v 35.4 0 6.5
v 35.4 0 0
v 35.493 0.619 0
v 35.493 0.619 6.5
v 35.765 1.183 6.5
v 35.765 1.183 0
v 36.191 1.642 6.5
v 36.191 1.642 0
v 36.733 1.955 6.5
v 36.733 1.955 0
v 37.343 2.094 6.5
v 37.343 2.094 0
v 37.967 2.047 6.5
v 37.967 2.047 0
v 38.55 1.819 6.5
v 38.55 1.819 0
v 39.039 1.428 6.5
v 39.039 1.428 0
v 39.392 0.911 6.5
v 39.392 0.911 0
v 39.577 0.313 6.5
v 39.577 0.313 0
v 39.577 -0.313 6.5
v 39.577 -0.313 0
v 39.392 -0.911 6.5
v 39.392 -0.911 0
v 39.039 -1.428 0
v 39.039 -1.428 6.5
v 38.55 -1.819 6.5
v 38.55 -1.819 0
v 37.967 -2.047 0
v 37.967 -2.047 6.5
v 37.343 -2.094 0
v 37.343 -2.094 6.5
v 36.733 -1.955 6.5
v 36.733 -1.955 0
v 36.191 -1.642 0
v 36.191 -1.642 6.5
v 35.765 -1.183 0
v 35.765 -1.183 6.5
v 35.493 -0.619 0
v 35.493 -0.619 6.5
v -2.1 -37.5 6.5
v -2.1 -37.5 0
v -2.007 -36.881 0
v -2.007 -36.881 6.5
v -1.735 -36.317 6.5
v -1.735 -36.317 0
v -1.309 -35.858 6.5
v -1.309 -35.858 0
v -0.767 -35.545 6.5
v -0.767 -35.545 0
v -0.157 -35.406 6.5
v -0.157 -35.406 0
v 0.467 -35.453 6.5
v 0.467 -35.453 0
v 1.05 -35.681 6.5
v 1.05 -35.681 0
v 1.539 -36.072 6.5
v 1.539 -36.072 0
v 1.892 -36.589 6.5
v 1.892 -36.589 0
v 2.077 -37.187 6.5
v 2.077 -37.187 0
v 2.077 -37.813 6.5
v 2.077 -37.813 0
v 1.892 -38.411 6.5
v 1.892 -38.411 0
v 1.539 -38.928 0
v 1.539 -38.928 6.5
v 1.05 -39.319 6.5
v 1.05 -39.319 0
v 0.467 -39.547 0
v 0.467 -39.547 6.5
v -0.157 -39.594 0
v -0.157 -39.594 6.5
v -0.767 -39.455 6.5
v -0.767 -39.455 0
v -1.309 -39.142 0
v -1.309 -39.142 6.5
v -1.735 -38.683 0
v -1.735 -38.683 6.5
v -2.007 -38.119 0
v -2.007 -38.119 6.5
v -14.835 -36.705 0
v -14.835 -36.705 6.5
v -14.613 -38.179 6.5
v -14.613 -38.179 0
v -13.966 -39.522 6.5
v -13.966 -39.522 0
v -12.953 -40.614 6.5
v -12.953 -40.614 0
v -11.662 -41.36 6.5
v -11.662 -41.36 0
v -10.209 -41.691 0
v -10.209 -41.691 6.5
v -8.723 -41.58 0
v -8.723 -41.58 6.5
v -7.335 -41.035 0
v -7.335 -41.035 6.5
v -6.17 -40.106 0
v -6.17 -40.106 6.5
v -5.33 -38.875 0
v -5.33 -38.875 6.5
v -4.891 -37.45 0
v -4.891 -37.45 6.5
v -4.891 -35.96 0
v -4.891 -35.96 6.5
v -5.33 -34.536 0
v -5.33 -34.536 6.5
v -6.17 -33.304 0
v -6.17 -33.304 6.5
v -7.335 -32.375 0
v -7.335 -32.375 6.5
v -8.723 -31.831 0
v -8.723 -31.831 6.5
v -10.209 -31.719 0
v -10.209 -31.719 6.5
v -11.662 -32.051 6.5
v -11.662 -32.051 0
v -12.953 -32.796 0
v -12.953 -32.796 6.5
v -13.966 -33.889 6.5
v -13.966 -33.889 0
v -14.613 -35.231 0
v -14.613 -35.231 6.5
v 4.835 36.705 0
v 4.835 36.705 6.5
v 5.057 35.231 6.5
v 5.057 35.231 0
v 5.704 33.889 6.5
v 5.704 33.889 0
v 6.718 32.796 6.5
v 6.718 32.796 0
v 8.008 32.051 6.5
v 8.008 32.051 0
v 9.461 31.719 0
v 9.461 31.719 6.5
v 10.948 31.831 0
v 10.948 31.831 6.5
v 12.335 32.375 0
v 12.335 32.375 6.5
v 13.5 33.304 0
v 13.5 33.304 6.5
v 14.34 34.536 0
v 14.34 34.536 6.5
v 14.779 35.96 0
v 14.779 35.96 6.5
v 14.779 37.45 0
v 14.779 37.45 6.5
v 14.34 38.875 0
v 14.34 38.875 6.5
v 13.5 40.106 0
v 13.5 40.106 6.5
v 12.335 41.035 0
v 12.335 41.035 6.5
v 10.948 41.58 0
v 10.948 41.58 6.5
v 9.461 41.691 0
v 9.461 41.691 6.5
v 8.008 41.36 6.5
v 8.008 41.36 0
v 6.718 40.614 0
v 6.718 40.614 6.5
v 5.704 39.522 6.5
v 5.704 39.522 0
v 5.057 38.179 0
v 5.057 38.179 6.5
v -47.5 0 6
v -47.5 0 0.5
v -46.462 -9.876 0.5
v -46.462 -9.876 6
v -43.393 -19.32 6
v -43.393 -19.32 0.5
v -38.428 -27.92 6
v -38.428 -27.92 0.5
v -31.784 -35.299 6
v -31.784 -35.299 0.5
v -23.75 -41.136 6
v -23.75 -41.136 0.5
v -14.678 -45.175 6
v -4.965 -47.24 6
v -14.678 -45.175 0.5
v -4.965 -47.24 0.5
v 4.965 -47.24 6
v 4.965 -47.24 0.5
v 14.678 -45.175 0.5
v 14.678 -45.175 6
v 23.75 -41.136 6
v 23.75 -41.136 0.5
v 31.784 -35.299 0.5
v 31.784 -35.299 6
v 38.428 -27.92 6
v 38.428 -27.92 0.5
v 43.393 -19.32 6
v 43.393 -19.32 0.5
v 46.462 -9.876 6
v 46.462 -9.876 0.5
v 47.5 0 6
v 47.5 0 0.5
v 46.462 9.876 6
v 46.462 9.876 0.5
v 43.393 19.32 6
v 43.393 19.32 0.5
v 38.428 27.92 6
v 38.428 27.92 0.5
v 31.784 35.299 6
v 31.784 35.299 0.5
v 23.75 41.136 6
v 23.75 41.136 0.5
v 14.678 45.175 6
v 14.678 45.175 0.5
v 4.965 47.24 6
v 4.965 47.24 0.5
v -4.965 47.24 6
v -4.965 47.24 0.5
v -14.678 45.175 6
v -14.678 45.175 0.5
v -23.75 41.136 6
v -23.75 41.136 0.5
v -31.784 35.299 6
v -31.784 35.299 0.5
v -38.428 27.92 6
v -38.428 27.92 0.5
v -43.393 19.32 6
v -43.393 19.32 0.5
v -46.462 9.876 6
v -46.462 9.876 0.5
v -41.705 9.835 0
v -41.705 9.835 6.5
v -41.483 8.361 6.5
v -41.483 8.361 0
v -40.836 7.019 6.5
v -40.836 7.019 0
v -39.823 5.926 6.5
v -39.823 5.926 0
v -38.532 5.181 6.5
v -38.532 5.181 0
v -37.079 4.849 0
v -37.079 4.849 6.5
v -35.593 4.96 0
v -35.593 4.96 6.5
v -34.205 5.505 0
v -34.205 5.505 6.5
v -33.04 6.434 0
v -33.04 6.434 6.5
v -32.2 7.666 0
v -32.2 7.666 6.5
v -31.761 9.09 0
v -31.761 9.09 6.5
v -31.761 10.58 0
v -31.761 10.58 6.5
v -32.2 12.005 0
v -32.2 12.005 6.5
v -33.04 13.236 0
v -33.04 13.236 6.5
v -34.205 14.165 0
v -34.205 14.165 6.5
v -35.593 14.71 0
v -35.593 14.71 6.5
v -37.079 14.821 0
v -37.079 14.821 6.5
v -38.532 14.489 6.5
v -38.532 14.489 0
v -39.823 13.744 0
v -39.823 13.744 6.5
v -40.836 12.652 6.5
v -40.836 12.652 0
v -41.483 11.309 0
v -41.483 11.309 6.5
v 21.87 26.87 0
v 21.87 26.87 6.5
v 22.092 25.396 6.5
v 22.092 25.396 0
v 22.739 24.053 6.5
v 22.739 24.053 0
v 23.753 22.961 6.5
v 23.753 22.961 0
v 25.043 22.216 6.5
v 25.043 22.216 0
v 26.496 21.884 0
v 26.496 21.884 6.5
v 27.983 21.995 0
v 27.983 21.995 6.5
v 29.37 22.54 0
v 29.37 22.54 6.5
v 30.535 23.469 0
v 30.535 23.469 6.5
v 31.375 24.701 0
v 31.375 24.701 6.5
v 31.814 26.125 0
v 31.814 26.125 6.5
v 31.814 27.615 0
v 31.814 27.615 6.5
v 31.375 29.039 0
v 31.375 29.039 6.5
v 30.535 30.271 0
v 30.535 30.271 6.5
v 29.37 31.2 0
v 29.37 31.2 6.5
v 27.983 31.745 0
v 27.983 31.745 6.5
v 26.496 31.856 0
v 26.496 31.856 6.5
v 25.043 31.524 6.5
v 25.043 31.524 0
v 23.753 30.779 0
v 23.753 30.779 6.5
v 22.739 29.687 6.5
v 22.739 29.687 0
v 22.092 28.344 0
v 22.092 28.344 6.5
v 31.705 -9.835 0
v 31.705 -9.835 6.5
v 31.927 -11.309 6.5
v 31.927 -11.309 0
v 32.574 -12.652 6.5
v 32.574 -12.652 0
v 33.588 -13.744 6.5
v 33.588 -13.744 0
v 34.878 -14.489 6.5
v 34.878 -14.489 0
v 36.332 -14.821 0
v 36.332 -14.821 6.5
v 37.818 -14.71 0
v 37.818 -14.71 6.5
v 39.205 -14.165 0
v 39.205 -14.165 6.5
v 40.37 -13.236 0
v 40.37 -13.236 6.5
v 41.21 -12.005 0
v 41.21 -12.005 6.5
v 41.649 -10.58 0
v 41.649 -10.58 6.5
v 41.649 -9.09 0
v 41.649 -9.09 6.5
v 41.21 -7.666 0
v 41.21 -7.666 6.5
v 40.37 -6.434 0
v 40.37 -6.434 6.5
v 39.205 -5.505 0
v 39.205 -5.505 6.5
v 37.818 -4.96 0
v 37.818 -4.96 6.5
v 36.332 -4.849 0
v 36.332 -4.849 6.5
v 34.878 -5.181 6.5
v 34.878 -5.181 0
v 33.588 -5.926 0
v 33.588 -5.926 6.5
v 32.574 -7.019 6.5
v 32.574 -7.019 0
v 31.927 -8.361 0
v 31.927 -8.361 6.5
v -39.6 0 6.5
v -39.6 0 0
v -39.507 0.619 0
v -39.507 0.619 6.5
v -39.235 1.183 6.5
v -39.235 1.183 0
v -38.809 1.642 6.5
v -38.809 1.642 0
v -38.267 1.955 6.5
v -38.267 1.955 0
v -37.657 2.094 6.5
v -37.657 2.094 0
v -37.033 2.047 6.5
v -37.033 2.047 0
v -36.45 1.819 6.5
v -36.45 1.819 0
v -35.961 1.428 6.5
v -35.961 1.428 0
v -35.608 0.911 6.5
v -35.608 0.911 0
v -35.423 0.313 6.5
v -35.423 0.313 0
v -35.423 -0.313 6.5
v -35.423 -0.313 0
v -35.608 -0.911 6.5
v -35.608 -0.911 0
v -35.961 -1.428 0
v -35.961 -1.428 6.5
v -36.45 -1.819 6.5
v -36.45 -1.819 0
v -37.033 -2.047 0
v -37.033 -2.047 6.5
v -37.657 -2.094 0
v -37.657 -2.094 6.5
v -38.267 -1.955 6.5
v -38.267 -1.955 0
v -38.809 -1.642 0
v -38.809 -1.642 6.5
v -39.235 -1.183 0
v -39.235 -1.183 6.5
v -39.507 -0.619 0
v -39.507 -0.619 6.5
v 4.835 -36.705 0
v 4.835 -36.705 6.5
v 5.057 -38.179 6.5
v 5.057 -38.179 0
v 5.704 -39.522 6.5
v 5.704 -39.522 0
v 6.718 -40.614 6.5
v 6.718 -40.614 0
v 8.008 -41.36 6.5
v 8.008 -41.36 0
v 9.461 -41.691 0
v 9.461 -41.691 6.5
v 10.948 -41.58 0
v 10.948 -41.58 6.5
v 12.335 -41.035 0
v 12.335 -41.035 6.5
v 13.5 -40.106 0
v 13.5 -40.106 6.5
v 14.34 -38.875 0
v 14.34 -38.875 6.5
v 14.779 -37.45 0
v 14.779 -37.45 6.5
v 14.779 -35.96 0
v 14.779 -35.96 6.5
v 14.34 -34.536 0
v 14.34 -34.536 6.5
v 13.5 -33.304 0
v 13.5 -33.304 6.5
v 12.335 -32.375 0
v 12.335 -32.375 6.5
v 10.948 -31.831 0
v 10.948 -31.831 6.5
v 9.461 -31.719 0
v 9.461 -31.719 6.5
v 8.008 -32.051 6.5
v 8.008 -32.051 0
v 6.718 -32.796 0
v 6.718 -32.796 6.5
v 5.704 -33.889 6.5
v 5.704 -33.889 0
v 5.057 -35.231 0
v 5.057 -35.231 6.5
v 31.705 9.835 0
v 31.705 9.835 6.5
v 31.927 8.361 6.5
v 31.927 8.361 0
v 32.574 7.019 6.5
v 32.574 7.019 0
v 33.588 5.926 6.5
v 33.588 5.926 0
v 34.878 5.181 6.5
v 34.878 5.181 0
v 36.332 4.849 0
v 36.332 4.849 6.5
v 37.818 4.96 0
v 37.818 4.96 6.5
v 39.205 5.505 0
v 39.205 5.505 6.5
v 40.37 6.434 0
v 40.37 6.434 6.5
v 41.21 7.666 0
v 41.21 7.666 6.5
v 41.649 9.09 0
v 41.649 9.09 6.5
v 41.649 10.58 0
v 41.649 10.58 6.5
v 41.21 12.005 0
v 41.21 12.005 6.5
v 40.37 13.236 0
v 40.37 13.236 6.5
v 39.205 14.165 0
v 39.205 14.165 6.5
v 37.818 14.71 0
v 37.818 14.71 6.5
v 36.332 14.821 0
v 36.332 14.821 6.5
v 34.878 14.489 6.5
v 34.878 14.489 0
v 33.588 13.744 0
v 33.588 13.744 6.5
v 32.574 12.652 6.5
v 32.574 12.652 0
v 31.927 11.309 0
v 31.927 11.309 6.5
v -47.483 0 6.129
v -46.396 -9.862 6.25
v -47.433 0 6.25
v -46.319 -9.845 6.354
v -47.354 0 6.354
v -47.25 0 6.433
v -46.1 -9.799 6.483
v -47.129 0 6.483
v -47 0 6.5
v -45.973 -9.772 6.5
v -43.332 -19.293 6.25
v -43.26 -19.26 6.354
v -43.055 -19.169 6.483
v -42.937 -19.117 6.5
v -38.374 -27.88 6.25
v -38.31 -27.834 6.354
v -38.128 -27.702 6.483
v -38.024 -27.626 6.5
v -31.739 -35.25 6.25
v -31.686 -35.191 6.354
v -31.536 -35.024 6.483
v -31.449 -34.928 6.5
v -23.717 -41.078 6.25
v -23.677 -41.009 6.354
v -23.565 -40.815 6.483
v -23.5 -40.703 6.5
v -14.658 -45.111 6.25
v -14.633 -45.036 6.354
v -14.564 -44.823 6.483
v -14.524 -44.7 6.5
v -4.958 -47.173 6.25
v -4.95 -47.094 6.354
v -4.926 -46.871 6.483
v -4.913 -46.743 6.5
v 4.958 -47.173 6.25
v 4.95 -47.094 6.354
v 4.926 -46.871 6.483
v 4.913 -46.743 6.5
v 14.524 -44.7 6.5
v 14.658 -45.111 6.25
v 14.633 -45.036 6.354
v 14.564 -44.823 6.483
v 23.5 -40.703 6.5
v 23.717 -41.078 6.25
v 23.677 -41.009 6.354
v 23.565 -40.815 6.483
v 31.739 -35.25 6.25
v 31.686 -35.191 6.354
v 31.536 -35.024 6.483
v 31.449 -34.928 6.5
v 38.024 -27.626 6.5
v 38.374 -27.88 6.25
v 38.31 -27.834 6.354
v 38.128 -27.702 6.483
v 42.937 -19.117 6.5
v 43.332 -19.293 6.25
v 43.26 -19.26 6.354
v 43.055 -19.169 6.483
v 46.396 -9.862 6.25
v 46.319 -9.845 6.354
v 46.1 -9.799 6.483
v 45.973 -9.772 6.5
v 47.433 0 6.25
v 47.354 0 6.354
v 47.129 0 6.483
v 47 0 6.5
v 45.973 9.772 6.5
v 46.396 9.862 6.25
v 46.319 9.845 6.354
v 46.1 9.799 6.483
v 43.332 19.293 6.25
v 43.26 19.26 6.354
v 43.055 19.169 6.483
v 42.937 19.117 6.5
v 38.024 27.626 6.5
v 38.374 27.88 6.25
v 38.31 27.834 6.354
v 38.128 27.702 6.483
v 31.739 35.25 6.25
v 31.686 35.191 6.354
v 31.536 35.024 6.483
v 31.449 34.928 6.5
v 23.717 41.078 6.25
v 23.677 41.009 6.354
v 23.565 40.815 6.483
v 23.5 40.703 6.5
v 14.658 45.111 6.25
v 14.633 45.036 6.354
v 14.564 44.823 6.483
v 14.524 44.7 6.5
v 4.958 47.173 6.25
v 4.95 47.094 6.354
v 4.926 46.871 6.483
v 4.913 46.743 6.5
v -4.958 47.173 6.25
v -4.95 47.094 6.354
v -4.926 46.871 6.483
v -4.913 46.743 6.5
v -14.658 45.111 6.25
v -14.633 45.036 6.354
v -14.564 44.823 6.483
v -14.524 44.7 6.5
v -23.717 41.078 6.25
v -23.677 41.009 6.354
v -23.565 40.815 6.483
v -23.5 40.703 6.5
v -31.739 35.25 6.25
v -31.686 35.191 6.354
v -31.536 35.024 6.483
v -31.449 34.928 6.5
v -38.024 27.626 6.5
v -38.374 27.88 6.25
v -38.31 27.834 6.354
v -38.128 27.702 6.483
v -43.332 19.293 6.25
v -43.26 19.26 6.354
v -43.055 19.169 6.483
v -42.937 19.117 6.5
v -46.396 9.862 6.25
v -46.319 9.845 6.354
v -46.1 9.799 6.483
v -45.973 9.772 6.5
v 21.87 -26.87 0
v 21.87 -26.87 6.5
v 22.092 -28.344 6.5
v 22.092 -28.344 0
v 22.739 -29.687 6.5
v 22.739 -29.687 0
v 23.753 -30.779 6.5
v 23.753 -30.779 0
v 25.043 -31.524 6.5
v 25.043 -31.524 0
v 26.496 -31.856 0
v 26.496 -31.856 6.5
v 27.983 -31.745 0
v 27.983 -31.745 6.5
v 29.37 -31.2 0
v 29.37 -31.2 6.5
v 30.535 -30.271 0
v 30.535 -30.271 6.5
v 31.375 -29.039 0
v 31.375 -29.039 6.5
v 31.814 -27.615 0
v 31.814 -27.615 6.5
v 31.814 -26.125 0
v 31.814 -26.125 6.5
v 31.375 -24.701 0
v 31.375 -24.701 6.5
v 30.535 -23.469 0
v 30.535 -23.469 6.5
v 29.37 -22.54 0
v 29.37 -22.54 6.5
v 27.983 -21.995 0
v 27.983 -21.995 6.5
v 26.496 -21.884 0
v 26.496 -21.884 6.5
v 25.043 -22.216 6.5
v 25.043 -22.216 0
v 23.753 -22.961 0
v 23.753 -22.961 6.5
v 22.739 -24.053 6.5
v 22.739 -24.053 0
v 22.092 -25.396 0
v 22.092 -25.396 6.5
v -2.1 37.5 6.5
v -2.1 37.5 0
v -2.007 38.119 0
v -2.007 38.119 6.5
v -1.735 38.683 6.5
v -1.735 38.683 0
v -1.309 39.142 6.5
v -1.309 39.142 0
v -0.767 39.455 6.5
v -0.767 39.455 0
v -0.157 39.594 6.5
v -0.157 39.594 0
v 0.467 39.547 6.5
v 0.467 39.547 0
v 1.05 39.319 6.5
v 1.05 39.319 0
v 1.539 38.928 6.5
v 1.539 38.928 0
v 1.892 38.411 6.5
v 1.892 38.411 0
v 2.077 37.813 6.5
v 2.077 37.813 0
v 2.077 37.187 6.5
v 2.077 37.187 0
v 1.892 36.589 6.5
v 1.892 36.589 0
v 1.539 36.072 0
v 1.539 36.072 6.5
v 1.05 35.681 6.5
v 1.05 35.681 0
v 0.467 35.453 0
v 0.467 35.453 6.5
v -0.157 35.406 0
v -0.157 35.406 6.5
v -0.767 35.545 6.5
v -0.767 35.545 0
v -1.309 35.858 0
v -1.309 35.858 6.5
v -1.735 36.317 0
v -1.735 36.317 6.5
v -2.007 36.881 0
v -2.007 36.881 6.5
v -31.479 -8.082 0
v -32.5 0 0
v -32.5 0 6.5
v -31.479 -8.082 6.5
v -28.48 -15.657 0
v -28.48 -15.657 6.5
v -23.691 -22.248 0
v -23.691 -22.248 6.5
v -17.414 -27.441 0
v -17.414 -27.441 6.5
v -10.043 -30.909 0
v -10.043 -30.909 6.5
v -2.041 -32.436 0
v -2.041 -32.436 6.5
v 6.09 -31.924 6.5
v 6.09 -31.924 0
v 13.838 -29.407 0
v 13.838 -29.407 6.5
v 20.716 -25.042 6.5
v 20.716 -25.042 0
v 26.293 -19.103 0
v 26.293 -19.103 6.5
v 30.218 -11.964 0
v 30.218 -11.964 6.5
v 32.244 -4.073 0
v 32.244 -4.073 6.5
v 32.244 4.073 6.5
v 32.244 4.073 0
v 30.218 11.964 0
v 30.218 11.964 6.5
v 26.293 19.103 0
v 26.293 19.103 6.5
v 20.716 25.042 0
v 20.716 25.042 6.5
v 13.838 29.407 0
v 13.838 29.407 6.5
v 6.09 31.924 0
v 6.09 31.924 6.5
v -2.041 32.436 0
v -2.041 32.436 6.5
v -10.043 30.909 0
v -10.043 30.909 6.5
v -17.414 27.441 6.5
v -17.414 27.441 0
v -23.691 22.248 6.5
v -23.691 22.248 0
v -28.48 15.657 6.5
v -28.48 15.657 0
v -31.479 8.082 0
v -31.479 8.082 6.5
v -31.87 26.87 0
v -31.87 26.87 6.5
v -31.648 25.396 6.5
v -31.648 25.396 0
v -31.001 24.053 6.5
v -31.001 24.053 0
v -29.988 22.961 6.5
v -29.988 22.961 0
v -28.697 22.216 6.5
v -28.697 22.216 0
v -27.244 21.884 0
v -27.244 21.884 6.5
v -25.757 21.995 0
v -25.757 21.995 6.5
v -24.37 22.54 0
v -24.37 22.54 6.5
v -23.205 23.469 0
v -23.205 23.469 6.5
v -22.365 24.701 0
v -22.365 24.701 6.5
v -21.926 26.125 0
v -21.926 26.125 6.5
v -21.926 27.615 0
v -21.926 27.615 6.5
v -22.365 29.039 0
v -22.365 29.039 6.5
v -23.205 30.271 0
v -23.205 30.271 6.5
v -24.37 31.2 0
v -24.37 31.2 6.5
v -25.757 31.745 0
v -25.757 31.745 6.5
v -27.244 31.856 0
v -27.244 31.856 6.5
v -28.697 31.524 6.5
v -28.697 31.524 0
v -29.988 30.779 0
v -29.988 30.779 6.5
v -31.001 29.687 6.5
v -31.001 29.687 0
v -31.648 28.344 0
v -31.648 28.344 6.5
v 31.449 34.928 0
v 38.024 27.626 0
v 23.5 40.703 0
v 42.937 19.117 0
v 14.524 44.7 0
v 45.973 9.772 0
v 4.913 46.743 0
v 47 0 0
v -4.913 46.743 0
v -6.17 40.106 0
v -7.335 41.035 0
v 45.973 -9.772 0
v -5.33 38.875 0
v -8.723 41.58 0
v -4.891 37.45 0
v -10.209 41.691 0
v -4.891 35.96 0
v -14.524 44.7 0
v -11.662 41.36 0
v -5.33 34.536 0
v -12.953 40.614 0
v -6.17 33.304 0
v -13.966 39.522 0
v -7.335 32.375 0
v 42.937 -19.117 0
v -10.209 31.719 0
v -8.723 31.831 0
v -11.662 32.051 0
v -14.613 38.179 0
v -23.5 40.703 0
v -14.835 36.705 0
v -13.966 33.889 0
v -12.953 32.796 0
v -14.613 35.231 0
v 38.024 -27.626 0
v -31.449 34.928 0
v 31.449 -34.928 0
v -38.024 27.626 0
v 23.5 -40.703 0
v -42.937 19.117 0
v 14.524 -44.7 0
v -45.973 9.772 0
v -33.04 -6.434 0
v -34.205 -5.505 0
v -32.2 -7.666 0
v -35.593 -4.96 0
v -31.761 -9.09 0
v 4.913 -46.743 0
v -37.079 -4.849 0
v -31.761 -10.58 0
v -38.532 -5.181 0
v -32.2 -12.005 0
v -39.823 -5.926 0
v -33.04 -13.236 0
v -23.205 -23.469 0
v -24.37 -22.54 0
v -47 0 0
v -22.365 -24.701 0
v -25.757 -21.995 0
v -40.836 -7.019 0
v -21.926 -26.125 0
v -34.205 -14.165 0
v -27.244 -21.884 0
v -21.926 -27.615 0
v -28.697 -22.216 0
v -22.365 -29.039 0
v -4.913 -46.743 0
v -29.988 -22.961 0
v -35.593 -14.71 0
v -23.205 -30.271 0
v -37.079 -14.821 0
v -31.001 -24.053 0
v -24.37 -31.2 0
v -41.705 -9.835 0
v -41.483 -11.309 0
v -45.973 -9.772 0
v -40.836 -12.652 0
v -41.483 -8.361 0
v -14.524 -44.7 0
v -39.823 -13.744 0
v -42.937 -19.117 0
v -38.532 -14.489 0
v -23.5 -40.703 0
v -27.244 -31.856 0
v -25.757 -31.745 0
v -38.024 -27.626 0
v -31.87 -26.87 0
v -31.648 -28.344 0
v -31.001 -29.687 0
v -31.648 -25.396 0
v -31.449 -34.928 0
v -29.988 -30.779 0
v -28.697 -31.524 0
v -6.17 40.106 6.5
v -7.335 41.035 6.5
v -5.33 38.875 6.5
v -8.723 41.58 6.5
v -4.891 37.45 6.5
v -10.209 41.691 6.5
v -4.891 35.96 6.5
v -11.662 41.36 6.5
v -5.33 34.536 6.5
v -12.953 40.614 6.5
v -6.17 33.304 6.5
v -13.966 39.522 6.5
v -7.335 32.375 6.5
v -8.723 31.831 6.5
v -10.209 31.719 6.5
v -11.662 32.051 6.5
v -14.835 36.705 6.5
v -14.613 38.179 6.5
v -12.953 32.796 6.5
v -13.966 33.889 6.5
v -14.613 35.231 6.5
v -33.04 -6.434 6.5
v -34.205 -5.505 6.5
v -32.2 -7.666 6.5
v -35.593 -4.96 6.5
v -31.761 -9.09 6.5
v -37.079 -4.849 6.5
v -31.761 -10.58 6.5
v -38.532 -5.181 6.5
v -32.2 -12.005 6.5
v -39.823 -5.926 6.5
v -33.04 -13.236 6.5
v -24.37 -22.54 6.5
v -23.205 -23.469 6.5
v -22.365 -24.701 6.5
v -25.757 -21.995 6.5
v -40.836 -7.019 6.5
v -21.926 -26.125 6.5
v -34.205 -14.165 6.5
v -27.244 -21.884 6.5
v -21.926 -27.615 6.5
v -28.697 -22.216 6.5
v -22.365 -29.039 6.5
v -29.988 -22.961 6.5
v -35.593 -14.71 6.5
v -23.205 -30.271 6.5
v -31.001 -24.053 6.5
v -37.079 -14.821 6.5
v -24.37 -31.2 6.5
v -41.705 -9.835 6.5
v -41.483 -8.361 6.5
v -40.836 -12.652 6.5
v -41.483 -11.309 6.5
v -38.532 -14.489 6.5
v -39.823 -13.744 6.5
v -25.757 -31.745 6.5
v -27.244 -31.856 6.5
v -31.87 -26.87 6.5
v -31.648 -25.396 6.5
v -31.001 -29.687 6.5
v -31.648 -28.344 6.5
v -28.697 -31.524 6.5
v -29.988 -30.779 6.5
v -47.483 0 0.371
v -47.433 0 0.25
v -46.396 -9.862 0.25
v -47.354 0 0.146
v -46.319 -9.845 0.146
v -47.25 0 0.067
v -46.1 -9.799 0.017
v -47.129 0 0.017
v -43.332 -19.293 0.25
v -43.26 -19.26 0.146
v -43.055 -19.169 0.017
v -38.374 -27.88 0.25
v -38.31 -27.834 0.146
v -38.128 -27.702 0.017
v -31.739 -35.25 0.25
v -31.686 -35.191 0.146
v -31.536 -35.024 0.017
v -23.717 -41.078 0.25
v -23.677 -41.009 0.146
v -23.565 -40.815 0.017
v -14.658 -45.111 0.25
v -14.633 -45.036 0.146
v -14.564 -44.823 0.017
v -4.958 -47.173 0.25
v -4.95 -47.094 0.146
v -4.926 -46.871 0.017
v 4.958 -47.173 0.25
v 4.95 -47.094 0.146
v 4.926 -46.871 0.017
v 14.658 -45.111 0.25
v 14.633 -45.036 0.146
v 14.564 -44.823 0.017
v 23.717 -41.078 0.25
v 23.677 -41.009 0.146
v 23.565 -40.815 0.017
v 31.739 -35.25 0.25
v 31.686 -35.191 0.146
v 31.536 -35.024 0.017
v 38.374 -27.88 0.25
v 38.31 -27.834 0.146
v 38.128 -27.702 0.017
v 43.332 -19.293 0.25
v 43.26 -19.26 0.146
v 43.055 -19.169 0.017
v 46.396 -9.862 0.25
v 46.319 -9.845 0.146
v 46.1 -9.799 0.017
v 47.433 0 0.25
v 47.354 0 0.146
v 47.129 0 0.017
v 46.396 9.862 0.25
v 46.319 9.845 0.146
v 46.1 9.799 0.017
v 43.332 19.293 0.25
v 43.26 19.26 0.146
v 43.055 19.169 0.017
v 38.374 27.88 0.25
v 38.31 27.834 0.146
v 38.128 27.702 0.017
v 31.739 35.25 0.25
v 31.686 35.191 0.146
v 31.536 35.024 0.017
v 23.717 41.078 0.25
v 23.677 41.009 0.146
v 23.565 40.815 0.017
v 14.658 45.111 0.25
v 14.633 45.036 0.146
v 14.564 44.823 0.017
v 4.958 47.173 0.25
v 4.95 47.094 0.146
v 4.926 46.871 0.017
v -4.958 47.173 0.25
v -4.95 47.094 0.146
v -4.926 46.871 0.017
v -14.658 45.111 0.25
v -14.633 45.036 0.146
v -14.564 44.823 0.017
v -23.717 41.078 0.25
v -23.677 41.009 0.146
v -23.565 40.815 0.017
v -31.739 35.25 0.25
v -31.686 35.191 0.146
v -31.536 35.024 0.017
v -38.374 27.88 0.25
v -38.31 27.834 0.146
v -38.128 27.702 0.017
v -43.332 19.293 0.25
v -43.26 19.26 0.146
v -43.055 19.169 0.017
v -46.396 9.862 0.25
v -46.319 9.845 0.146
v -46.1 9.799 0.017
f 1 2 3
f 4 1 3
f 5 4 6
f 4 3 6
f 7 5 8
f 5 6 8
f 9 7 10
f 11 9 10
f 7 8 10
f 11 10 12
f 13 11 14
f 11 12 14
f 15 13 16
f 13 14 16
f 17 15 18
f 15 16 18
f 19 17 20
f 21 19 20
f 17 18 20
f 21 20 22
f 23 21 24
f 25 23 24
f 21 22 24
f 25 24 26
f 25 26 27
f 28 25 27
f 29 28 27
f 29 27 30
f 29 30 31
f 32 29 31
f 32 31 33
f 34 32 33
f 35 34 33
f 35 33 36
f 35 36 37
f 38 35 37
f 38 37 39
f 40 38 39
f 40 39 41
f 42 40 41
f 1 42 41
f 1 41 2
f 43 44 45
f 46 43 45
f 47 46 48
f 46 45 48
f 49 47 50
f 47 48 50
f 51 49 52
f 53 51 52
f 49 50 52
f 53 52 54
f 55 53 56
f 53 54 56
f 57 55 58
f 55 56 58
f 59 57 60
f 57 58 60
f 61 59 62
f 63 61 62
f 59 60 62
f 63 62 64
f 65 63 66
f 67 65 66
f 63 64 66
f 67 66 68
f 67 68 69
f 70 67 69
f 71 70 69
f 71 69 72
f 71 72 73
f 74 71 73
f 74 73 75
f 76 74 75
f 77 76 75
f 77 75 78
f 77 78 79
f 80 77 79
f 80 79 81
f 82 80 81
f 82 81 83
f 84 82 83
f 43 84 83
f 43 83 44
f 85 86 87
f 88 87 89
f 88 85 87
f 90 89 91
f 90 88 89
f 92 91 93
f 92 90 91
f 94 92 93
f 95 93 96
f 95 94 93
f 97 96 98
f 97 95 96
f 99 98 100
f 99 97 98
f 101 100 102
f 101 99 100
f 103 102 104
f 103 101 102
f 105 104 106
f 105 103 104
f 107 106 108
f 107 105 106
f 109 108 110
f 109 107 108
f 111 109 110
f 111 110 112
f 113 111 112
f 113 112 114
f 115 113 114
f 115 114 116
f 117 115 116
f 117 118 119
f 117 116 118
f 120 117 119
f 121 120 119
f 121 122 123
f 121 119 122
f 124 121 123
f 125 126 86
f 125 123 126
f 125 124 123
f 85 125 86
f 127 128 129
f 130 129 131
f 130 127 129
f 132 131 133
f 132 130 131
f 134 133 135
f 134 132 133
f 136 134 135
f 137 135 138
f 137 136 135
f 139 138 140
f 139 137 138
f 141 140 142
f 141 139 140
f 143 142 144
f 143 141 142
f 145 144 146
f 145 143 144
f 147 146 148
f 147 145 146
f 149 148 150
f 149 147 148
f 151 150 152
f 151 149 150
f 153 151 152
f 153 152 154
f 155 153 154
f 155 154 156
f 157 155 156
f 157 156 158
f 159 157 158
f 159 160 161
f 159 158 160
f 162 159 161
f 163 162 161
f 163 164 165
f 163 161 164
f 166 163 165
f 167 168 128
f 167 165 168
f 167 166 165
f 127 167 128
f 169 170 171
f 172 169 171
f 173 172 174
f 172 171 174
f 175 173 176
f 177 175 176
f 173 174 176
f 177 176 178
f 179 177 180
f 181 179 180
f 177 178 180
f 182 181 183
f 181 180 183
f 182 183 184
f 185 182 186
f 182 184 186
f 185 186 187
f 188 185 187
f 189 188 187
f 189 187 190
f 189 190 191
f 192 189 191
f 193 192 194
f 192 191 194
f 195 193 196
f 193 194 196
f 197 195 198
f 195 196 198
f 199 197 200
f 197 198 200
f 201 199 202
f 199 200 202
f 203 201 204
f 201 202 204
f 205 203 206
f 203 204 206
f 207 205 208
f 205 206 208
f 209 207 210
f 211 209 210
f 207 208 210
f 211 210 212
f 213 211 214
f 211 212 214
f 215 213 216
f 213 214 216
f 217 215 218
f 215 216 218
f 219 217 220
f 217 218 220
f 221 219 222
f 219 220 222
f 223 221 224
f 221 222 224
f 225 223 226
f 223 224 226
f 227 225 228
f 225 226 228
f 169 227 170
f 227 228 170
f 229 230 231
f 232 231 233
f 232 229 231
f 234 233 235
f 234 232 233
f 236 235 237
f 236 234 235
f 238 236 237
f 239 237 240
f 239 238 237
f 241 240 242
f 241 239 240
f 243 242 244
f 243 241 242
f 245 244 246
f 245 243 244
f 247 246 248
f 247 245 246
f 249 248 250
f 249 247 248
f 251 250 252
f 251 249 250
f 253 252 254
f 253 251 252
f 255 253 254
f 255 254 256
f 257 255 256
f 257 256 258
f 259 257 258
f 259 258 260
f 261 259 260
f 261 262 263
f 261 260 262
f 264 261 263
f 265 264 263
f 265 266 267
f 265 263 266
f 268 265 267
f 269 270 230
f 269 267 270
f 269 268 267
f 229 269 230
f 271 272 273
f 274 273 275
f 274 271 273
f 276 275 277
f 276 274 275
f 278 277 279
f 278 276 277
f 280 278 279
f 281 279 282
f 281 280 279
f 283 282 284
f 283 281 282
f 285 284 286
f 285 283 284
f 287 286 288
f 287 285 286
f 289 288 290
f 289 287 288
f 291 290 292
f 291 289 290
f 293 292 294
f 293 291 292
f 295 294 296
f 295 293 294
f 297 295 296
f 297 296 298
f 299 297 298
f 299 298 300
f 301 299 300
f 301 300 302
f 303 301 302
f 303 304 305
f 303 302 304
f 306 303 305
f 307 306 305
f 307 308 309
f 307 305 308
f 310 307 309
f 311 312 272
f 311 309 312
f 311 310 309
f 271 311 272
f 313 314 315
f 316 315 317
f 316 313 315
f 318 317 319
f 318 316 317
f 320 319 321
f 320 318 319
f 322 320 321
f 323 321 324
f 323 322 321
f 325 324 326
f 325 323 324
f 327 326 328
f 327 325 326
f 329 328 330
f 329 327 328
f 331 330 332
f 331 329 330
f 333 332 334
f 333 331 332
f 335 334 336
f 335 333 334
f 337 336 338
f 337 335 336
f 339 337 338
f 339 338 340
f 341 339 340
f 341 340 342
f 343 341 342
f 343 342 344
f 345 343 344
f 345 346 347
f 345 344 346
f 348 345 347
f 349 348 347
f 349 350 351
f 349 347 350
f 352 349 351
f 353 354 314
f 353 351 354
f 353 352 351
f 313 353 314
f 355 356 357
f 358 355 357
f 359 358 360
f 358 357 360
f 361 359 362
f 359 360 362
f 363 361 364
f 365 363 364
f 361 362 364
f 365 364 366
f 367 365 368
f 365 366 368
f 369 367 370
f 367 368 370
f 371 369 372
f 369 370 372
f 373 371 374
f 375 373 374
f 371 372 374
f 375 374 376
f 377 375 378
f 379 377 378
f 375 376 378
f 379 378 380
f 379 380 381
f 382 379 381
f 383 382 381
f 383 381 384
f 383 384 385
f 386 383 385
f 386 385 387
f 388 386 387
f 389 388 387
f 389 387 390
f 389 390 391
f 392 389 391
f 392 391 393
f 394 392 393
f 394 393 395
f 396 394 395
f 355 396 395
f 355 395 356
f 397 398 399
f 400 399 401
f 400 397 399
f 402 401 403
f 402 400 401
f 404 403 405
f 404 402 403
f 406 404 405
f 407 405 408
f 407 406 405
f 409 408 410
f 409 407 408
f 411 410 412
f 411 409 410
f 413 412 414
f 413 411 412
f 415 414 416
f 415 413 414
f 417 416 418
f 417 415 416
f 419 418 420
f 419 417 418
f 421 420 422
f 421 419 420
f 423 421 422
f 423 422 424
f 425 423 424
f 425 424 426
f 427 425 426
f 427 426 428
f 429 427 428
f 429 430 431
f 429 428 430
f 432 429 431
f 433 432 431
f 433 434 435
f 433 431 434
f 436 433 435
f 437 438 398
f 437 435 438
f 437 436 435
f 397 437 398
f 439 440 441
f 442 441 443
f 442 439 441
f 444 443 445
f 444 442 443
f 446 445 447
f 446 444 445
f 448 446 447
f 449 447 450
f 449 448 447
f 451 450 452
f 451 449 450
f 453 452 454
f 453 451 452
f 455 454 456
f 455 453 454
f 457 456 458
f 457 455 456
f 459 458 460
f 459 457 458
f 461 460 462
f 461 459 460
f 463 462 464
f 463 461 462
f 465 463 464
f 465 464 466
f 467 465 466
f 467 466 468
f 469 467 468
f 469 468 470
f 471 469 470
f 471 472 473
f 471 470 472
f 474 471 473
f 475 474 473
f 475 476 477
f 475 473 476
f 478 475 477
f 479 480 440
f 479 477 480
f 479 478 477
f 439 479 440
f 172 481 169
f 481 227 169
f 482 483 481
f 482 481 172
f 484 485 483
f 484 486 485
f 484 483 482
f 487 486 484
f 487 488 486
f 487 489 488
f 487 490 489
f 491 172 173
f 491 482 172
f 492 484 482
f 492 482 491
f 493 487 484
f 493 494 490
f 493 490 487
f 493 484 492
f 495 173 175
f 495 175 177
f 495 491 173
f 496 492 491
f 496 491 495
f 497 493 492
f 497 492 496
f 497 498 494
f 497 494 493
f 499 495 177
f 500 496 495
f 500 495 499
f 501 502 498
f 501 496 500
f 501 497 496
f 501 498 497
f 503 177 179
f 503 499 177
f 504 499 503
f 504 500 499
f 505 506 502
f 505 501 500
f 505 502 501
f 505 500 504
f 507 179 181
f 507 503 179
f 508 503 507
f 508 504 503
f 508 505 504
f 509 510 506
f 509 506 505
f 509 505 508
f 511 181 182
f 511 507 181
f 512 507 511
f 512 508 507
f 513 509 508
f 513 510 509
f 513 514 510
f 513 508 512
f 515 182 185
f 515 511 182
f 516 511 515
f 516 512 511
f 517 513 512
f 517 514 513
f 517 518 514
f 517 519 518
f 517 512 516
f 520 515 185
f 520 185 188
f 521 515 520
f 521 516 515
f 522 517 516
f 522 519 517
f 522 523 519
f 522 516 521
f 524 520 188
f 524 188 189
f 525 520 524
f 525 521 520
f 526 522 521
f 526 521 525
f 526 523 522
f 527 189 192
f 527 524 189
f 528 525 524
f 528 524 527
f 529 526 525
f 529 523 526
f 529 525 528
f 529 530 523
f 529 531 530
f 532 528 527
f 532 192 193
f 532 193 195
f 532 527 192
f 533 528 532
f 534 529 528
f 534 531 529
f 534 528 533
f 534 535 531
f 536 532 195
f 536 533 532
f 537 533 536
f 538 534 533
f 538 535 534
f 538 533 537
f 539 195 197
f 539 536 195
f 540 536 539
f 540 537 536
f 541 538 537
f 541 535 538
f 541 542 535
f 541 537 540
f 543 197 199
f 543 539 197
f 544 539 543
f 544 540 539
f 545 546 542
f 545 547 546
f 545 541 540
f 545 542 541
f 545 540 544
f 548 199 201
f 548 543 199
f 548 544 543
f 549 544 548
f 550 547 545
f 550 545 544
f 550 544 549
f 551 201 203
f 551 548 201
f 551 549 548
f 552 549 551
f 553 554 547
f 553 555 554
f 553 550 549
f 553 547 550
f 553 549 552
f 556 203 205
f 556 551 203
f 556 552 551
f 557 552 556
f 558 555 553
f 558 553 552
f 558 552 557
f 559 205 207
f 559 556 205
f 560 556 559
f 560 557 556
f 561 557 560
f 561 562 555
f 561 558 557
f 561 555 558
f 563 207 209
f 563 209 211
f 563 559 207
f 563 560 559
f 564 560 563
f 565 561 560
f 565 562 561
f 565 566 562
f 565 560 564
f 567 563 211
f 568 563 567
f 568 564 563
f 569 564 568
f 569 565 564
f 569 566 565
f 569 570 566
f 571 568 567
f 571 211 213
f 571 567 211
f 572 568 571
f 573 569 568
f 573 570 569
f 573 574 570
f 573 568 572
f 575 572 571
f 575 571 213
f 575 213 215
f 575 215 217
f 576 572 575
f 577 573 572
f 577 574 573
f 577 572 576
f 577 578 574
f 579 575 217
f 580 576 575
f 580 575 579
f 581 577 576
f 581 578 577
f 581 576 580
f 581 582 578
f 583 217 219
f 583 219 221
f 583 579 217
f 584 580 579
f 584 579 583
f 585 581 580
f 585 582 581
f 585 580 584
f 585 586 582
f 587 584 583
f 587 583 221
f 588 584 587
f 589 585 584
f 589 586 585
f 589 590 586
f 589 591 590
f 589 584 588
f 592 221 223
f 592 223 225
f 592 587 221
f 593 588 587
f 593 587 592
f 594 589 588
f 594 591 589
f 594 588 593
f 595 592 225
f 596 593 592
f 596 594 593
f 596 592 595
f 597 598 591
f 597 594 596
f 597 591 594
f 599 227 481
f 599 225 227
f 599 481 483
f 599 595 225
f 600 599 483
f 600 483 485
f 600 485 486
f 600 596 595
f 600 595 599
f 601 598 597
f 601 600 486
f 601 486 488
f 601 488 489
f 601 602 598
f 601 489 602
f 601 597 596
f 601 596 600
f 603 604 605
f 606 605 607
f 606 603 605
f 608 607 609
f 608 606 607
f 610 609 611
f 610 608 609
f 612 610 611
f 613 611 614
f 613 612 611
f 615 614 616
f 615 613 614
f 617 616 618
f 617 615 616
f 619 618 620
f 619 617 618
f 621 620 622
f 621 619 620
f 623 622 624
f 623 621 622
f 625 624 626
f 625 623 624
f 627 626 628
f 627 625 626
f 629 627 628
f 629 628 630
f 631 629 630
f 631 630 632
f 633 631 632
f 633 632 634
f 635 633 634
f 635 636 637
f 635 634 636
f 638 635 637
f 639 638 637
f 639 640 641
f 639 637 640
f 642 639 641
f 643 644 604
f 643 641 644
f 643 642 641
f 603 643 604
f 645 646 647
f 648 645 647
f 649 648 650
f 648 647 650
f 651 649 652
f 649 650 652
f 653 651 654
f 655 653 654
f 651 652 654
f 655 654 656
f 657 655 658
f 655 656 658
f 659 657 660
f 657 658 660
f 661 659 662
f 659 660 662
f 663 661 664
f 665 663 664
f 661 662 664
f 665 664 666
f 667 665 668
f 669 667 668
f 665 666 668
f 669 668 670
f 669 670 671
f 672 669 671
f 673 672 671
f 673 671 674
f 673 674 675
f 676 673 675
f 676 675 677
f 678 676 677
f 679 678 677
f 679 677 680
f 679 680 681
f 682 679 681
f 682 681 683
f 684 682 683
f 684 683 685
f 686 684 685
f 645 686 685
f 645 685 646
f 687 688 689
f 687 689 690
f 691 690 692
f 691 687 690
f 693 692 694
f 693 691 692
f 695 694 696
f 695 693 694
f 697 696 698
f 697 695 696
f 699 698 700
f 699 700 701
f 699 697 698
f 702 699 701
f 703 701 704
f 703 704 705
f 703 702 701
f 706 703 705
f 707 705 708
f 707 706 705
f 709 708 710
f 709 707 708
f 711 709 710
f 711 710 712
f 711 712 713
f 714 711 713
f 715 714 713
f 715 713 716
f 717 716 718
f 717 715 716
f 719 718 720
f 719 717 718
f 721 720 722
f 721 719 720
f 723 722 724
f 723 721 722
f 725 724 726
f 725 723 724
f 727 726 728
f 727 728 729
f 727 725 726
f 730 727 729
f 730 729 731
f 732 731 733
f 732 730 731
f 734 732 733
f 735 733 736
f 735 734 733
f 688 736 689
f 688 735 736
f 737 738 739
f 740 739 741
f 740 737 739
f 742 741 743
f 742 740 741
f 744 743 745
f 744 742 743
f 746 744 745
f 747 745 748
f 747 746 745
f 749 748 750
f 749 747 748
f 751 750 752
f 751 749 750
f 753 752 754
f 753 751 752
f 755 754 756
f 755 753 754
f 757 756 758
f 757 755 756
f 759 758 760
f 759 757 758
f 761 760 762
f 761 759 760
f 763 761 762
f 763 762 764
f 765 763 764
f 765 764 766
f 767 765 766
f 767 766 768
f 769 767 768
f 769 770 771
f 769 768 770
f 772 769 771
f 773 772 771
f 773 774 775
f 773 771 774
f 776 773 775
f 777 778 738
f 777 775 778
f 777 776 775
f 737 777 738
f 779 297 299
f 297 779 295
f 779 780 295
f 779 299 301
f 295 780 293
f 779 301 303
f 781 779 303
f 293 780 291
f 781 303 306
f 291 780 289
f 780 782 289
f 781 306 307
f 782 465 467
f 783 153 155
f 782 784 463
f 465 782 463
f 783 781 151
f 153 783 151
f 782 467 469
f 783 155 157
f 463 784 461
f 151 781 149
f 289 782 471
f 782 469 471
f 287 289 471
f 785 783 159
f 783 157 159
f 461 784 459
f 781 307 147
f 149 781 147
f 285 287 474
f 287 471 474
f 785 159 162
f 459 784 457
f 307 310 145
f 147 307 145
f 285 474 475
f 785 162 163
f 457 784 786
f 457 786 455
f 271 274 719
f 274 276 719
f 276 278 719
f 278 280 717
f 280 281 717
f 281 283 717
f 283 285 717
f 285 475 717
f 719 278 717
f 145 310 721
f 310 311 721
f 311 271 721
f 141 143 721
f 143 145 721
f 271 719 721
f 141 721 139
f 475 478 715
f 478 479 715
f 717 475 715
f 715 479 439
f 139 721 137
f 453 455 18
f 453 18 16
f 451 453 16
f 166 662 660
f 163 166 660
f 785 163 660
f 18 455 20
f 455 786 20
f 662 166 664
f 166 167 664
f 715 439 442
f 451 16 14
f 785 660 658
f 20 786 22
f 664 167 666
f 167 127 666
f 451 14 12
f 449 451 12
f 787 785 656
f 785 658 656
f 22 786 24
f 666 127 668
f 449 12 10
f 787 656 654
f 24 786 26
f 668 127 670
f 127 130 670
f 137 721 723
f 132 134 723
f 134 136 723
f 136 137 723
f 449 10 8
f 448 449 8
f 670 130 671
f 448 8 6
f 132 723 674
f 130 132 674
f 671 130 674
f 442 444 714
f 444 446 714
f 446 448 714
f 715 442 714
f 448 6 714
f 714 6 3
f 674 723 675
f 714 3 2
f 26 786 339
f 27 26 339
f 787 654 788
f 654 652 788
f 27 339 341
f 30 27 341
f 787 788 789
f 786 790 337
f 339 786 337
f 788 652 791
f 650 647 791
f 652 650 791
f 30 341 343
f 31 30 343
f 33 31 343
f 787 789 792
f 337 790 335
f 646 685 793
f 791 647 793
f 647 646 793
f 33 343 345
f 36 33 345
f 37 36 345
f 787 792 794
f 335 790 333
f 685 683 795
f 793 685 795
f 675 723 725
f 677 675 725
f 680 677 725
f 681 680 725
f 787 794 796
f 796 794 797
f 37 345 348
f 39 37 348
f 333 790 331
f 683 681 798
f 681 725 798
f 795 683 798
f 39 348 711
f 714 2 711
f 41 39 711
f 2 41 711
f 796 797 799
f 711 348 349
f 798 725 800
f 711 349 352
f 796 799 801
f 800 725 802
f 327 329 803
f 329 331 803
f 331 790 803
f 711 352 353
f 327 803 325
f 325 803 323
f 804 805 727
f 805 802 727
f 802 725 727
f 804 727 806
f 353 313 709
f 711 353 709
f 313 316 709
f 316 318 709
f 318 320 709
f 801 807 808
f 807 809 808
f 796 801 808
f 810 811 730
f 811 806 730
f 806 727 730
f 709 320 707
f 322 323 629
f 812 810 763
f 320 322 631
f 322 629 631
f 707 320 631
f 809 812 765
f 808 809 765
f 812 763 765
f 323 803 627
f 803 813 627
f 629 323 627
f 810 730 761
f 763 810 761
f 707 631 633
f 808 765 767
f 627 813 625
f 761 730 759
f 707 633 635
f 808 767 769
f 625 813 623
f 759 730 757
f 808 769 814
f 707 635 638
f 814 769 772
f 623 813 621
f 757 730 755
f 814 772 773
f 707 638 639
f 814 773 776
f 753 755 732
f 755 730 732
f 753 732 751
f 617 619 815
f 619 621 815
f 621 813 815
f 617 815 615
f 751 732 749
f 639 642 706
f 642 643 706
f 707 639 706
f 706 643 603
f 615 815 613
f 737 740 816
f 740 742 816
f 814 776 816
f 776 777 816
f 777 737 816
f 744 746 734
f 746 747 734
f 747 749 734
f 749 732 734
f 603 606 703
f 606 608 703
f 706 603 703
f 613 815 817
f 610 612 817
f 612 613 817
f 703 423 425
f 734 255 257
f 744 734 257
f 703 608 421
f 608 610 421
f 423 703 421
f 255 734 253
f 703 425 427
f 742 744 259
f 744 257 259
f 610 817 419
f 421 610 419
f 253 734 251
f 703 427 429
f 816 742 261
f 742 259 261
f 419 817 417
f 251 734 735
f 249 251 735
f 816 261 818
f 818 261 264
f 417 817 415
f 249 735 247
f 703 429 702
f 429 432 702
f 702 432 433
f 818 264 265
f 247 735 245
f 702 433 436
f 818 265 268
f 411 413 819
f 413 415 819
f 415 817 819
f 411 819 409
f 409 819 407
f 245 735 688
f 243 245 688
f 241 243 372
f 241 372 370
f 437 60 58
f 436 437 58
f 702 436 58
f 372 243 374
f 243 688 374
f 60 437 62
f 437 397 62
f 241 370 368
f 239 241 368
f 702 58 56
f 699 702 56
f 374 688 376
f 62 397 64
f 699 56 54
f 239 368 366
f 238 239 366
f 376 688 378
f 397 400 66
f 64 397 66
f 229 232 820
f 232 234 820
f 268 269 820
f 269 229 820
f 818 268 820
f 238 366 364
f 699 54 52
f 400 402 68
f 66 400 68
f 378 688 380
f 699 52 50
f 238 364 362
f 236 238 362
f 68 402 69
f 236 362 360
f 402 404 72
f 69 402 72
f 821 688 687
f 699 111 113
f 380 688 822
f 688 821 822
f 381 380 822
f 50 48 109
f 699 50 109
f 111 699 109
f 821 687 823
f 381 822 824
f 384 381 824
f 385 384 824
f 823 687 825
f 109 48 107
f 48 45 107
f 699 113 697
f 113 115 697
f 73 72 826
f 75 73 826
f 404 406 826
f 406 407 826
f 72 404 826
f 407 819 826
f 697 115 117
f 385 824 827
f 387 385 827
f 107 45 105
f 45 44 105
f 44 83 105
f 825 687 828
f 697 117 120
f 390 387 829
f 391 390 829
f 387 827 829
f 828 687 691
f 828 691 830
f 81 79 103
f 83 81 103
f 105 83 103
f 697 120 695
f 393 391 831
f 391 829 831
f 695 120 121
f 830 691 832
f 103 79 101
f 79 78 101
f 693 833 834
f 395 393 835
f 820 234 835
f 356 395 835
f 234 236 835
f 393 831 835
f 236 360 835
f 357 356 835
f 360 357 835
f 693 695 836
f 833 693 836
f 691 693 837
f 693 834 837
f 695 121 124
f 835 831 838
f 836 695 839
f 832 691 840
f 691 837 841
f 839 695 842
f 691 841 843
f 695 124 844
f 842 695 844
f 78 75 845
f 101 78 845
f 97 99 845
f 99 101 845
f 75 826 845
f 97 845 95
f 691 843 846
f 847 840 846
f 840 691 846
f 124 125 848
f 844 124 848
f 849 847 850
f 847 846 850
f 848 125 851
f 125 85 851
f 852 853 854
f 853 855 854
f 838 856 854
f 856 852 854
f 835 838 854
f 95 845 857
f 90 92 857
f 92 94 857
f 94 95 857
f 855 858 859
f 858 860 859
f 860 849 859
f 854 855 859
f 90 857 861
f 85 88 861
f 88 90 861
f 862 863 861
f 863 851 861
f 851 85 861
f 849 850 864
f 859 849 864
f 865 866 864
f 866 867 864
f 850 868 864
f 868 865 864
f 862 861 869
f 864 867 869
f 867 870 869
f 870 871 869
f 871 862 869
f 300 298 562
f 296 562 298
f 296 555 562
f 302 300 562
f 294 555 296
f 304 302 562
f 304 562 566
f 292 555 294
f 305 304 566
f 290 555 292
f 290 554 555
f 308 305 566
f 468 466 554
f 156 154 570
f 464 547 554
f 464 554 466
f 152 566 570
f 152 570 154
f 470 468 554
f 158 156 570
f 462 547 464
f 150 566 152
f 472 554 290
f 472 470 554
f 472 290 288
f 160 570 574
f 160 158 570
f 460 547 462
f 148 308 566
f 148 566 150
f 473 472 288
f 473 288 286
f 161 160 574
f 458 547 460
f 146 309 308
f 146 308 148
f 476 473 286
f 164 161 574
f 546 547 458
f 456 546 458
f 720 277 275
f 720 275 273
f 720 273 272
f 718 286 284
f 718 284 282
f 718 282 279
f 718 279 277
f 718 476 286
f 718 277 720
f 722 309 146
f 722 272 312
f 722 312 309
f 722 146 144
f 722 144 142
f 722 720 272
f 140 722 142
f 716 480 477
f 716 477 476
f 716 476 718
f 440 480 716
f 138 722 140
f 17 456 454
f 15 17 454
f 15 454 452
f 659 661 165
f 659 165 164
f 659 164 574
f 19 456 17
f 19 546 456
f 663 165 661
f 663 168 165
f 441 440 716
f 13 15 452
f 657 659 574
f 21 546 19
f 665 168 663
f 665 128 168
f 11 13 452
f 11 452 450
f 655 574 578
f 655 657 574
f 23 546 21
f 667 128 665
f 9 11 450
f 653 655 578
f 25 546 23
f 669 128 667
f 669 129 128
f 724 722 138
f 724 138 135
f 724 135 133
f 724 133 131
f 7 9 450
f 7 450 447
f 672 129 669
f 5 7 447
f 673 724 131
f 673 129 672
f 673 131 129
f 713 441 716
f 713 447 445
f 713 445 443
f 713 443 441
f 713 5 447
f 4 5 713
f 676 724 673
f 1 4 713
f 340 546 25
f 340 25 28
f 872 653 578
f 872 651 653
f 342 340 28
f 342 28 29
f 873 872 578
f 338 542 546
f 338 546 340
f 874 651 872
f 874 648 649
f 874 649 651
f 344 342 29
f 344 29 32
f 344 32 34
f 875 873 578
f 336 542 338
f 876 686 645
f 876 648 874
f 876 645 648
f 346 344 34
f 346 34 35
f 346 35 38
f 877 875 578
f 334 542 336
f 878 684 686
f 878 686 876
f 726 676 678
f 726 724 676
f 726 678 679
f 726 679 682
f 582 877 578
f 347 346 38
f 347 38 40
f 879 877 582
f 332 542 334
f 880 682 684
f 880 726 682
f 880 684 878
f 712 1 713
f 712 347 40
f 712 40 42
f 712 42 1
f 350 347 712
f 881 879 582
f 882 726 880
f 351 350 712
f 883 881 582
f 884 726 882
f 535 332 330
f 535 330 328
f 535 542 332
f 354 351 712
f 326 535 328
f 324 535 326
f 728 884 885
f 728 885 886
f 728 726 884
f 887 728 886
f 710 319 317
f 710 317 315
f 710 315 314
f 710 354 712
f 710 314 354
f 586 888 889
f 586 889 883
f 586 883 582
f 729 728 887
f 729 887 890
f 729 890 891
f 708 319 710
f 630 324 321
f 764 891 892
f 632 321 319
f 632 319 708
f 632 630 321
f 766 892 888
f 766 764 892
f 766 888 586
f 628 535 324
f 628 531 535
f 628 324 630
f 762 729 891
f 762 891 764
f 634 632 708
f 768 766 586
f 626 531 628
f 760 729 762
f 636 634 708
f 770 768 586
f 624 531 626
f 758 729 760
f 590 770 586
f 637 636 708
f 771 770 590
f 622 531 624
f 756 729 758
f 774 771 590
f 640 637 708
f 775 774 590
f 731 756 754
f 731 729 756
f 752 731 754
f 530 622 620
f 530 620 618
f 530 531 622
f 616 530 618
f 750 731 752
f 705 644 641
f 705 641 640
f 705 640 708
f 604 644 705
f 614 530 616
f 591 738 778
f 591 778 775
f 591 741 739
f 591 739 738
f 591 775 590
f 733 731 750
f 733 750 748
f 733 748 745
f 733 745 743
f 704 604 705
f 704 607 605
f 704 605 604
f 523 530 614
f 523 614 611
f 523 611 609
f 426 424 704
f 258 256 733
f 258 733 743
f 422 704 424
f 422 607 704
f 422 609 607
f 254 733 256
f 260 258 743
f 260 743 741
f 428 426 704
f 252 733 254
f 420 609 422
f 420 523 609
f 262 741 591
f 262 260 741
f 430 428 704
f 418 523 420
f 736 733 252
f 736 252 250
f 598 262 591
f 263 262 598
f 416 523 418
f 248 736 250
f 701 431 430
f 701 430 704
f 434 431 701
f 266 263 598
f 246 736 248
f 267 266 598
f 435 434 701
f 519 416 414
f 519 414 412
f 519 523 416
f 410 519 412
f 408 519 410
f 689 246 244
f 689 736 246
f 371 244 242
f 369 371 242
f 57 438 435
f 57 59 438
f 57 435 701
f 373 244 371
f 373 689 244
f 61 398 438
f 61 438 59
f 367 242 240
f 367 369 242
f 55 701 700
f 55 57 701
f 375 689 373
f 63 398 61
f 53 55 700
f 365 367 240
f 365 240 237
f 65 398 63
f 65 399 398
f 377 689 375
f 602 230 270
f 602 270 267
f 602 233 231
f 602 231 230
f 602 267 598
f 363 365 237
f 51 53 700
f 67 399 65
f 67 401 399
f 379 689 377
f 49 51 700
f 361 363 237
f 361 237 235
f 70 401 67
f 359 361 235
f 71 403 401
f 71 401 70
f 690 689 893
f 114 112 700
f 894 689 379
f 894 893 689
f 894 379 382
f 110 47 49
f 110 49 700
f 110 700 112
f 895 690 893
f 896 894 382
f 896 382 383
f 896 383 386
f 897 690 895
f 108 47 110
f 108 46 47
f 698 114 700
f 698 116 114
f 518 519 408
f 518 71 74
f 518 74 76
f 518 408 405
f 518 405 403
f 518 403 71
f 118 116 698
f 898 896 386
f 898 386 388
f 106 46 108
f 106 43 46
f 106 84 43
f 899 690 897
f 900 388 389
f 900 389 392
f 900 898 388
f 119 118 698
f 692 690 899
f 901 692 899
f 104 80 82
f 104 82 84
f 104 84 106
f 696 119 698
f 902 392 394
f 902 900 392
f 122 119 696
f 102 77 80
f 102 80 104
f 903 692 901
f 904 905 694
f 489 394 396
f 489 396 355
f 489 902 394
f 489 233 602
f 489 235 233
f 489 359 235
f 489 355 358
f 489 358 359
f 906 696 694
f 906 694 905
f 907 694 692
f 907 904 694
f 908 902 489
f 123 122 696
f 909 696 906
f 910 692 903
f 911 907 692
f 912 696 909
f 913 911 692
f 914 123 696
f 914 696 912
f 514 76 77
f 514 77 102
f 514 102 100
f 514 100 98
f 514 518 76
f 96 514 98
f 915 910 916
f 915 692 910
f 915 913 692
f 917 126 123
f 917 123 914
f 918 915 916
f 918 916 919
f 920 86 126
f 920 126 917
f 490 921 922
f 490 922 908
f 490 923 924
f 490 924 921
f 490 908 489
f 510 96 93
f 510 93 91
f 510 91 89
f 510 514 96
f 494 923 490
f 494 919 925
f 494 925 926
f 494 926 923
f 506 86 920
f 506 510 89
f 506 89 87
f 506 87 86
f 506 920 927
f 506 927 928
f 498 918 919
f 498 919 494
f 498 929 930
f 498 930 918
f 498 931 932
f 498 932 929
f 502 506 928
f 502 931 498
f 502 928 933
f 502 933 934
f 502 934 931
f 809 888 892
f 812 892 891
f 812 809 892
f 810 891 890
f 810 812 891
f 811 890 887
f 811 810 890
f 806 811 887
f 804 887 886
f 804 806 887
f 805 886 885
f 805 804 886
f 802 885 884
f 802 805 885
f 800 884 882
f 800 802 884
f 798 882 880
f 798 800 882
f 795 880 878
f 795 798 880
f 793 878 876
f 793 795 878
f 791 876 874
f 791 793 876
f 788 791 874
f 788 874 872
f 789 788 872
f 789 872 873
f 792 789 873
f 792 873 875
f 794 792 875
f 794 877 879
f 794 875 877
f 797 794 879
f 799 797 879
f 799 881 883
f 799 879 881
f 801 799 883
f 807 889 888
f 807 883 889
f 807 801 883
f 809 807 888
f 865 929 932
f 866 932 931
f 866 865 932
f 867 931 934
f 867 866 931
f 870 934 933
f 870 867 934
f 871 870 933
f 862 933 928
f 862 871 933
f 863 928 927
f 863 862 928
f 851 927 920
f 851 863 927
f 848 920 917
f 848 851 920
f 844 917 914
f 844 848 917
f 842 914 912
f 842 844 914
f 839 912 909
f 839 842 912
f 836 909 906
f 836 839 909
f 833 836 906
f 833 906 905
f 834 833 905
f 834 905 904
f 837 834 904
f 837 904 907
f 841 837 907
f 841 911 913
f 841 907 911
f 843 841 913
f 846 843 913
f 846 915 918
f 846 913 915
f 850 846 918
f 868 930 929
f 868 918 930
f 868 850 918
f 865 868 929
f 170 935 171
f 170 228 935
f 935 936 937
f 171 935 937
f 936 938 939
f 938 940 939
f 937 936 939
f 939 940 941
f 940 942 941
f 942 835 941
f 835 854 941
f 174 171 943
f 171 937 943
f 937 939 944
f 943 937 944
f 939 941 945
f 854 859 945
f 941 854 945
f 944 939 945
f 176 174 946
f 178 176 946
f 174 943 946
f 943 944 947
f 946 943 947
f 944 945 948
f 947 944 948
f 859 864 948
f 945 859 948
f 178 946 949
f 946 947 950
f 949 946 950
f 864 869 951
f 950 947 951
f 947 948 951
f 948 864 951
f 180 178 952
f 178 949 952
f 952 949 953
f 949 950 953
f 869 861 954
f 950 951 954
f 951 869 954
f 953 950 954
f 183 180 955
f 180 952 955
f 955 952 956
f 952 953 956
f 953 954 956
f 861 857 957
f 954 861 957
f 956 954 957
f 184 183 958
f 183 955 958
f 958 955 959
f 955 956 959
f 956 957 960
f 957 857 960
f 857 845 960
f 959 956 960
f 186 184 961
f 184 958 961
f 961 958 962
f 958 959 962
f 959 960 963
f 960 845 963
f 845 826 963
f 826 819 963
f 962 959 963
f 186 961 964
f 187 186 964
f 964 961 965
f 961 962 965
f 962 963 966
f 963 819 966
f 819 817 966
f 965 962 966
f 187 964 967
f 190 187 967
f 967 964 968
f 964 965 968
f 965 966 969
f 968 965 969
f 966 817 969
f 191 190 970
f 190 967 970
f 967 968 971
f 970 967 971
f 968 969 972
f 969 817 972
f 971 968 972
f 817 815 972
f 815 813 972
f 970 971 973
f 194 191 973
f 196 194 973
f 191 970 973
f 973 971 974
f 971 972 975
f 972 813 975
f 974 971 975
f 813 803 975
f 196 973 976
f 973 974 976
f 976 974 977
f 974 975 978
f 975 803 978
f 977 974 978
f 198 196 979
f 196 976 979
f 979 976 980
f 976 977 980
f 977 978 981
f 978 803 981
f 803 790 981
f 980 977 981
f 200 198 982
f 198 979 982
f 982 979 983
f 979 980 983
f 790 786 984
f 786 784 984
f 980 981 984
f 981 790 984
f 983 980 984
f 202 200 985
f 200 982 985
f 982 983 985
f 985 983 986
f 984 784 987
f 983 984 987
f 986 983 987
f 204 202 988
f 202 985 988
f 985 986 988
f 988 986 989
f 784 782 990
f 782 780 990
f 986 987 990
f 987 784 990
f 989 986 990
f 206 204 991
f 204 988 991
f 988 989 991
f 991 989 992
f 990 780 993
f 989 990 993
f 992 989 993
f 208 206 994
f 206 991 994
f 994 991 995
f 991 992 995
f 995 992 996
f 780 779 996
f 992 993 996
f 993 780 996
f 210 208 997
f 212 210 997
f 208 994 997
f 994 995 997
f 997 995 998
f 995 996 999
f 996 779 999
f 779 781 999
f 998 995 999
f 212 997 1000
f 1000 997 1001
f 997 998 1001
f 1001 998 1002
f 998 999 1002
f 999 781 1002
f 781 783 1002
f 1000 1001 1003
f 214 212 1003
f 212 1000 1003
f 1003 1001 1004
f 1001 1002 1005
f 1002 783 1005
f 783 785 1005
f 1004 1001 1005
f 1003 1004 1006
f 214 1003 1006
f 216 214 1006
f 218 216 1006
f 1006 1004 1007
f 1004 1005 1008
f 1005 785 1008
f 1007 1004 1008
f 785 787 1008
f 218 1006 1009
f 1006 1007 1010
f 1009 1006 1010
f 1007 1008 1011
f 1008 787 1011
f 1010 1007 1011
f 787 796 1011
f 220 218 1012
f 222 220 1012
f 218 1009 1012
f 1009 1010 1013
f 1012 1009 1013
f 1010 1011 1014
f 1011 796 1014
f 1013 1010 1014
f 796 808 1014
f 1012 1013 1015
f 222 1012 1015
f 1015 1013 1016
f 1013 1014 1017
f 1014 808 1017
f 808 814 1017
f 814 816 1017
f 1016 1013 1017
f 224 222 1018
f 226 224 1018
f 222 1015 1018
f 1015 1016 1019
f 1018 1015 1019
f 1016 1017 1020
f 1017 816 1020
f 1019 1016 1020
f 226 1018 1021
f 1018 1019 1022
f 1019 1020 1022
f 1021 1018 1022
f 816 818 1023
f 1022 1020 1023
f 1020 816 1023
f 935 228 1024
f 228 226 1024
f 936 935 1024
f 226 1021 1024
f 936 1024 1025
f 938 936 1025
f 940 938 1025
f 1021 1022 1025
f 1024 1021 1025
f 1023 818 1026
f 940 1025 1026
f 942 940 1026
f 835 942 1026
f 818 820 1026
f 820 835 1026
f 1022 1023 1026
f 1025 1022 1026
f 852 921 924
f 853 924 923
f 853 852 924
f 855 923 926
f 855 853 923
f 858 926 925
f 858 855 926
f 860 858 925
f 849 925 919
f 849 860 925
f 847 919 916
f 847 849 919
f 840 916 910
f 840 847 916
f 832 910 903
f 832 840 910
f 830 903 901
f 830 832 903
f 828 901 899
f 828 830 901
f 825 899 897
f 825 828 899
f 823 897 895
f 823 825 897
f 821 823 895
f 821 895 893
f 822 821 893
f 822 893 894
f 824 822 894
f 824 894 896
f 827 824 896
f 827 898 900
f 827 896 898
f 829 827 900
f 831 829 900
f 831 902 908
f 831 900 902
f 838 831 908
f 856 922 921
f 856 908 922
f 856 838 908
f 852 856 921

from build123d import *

# Parameters (mm, degrees)
SKETCH1_R             = 47.5
SKETCH1_R_2           = 32.5
BOSS_EXTRUDE1_DEPTH   = 6.5
SKETCH2_R             = 5
CUT_EXTRUDE1_DEPTH    = 68.488887974
M5X0_8_TAPPED_HOLE1_D = 4.2
FILLET1_R             = 0.5


with BuildPart() as part:
    # Sketch1 → Boss-Extrude1 (new body)
    with BuildSketch(Plane.XY):
        with Locations(Location((0, 0, 0), (0, 0, 180))):
            Circle(SKETCH1_R)
        with Locations(Location((0, 0, 0), (0, 0, 180))):
            Circle(SKETCH1_R_2, mode=Mode.SUBTRACT)
    extrude(amount=BOSS_EXTRUDE1_DEPTH)

    # Sketch2 → Cut-Extrude1 (cut, through all)
    with BuildSketch(Plane.XY):
        with Locations(Location((9.835123714, 36.705181399, 0), (0, 0, 180))):
            Circle(SKETCH2_R)
        with Locations(Location((26.870057685, 26.870057685, 0), (0, 0, 180))):
            Circle(SKETCH2_R)
        with Locations(Location((36.705181399, 9.835123714, 0), (0, 0, 180))):
            Circle(SKETCH2_R)
        with Locations(Location((36.705181399, -9.835123714, 0), (0, 0, 180))):
            Circle(SKETCH2_R)
        with Locations(Location((26.870057685, -26.870057685, 0), (0, 0, 180))):
            Circle(SKETCH2_R)
        with Locations(Location((9.835123714, -36.705181399, 0), (0, 0, 180))):
            Circle(SKETCH2_R)
        with Locations(Location((-9.835123714, -36.705181399, 0), (0, 0, 180))):
            Circle(SKETCH2_R)
        with Locations(Location((-26.870057685, -26.870057685, 0), (0, 0, 180))):
            Circle(SKETCH2_R)
        with Locations(Location((-36.705181399, -9.835123714, 0), (0, 0, 180))):
            Circle(SKETCH2_R)
        with Locations(Location((-36.705181399, 9.835123714, 0), (0, 0, 180))):
            Circle(SKETCH2_R)
        with Locations(Location((-26.870057685, 26.870057685, 0), (0, 0, 180))):
            Circle(SKETCH2_R)
        with Locations(Location((-9.835123714, 36.705181399, 0), (0, 0, 180))):
            Circle(SKETCH2_R)
    extrude(amount=CUT_EXTRUDE1_DEPTH, mode=Mode.SUBTRACT)

    # M5x0.8 Tapped Hole1 (through all)
    with Locations(Plane.XY.offset(6.5)):
        with Locations((0, 37.5), (-37.5, 0), (37.5, 0), (0, -37.5)):
            Hole(M5X0_8_TAPPED_HOLE1_D / 2)

    # Fillet1
    fillet1_edges = [part.edges().sort_by_distance(p)[0] for p in [
        (47.5, 0, 0),
        (47.5, 0, 6.5),
    ]]
    fillet(fillet1_edges, radius=FILLET1_R)


solid = part.part
